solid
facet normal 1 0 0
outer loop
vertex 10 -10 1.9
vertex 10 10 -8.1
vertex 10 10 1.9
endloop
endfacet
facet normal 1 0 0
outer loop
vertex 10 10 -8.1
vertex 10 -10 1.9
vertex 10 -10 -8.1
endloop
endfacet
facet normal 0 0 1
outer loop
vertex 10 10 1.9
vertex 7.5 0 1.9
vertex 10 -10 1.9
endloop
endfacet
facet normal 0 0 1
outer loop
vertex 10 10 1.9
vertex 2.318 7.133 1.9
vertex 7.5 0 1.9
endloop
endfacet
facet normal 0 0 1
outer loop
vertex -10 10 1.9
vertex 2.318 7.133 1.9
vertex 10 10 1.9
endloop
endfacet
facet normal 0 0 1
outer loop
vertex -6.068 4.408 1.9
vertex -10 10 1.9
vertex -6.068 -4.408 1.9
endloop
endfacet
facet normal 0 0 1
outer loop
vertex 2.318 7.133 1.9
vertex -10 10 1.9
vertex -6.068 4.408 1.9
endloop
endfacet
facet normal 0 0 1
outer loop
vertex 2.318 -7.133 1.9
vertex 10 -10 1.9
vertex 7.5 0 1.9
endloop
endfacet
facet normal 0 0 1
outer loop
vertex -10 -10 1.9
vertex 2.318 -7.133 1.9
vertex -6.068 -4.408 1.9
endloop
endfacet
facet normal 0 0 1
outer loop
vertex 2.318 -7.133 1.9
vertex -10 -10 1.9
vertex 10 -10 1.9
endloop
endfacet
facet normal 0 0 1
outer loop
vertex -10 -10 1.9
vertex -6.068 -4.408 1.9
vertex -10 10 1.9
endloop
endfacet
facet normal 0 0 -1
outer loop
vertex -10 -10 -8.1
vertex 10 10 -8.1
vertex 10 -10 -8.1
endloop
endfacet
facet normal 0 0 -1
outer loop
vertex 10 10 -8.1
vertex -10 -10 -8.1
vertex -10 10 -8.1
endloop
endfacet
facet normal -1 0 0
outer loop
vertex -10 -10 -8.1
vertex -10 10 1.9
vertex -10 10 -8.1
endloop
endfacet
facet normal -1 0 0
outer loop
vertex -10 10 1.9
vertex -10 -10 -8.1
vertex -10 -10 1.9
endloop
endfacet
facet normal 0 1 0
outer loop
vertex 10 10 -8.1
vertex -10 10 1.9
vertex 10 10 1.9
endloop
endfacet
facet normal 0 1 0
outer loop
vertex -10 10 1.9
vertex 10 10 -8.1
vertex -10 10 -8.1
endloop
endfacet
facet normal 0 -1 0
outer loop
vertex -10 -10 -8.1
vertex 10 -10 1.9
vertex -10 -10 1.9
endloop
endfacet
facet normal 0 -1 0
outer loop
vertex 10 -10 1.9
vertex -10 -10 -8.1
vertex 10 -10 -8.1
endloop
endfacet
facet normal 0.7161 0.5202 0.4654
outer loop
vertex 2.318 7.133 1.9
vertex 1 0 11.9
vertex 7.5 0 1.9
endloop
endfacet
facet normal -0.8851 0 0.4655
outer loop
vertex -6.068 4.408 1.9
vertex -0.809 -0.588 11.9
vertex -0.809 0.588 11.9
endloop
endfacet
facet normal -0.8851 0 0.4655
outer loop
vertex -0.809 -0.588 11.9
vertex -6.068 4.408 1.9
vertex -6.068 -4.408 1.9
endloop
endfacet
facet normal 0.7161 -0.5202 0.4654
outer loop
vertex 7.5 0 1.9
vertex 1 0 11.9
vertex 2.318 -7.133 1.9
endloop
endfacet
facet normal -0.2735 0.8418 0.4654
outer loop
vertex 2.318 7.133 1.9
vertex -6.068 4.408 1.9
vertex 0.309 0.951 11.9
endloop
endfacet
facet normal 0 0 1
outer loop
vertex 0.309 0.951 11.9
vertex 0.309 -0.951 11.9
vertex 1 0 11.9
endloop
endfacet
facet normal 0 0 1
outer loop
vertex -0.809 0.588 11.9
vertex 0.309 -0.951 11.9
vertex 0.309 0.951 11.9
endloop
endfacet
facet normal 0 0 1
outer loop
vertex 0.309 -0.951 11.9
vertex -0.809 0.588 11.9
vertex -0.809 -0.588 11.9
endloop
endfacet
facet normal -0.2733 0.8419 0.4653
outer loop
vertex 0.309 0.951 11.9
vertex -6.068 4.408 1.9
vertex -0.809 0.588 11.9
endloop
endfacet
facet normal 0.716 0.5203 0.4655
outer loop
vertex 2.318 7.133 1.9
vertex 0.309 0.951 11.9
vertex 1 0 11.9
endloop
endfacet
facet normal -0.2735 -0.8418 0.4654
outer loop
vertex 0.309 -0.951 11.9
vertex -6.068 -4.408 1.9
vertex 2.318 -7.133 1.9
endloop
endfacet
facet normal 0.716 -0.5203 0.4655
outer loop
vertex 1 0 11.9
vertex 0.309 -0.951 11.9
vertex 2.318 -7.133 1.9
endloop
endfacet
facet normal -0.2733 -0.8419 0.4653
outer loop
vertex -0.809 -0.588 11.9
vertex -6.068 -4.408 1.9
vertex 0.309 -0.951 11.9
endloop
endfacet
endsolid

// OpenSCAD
/* coincident tests */
translate([0,0,1.9]) {
    // polygon(points=[[1,2],[3,4],[5,6]]);
    translate([0,0,-5]) {
        cube([20,20,10], center=true);
    }
    translate([0,0,+5]) {
        cylinder(h = 10, d1 = 15, d2=2, $fn = 5, center=true);
    }
}
